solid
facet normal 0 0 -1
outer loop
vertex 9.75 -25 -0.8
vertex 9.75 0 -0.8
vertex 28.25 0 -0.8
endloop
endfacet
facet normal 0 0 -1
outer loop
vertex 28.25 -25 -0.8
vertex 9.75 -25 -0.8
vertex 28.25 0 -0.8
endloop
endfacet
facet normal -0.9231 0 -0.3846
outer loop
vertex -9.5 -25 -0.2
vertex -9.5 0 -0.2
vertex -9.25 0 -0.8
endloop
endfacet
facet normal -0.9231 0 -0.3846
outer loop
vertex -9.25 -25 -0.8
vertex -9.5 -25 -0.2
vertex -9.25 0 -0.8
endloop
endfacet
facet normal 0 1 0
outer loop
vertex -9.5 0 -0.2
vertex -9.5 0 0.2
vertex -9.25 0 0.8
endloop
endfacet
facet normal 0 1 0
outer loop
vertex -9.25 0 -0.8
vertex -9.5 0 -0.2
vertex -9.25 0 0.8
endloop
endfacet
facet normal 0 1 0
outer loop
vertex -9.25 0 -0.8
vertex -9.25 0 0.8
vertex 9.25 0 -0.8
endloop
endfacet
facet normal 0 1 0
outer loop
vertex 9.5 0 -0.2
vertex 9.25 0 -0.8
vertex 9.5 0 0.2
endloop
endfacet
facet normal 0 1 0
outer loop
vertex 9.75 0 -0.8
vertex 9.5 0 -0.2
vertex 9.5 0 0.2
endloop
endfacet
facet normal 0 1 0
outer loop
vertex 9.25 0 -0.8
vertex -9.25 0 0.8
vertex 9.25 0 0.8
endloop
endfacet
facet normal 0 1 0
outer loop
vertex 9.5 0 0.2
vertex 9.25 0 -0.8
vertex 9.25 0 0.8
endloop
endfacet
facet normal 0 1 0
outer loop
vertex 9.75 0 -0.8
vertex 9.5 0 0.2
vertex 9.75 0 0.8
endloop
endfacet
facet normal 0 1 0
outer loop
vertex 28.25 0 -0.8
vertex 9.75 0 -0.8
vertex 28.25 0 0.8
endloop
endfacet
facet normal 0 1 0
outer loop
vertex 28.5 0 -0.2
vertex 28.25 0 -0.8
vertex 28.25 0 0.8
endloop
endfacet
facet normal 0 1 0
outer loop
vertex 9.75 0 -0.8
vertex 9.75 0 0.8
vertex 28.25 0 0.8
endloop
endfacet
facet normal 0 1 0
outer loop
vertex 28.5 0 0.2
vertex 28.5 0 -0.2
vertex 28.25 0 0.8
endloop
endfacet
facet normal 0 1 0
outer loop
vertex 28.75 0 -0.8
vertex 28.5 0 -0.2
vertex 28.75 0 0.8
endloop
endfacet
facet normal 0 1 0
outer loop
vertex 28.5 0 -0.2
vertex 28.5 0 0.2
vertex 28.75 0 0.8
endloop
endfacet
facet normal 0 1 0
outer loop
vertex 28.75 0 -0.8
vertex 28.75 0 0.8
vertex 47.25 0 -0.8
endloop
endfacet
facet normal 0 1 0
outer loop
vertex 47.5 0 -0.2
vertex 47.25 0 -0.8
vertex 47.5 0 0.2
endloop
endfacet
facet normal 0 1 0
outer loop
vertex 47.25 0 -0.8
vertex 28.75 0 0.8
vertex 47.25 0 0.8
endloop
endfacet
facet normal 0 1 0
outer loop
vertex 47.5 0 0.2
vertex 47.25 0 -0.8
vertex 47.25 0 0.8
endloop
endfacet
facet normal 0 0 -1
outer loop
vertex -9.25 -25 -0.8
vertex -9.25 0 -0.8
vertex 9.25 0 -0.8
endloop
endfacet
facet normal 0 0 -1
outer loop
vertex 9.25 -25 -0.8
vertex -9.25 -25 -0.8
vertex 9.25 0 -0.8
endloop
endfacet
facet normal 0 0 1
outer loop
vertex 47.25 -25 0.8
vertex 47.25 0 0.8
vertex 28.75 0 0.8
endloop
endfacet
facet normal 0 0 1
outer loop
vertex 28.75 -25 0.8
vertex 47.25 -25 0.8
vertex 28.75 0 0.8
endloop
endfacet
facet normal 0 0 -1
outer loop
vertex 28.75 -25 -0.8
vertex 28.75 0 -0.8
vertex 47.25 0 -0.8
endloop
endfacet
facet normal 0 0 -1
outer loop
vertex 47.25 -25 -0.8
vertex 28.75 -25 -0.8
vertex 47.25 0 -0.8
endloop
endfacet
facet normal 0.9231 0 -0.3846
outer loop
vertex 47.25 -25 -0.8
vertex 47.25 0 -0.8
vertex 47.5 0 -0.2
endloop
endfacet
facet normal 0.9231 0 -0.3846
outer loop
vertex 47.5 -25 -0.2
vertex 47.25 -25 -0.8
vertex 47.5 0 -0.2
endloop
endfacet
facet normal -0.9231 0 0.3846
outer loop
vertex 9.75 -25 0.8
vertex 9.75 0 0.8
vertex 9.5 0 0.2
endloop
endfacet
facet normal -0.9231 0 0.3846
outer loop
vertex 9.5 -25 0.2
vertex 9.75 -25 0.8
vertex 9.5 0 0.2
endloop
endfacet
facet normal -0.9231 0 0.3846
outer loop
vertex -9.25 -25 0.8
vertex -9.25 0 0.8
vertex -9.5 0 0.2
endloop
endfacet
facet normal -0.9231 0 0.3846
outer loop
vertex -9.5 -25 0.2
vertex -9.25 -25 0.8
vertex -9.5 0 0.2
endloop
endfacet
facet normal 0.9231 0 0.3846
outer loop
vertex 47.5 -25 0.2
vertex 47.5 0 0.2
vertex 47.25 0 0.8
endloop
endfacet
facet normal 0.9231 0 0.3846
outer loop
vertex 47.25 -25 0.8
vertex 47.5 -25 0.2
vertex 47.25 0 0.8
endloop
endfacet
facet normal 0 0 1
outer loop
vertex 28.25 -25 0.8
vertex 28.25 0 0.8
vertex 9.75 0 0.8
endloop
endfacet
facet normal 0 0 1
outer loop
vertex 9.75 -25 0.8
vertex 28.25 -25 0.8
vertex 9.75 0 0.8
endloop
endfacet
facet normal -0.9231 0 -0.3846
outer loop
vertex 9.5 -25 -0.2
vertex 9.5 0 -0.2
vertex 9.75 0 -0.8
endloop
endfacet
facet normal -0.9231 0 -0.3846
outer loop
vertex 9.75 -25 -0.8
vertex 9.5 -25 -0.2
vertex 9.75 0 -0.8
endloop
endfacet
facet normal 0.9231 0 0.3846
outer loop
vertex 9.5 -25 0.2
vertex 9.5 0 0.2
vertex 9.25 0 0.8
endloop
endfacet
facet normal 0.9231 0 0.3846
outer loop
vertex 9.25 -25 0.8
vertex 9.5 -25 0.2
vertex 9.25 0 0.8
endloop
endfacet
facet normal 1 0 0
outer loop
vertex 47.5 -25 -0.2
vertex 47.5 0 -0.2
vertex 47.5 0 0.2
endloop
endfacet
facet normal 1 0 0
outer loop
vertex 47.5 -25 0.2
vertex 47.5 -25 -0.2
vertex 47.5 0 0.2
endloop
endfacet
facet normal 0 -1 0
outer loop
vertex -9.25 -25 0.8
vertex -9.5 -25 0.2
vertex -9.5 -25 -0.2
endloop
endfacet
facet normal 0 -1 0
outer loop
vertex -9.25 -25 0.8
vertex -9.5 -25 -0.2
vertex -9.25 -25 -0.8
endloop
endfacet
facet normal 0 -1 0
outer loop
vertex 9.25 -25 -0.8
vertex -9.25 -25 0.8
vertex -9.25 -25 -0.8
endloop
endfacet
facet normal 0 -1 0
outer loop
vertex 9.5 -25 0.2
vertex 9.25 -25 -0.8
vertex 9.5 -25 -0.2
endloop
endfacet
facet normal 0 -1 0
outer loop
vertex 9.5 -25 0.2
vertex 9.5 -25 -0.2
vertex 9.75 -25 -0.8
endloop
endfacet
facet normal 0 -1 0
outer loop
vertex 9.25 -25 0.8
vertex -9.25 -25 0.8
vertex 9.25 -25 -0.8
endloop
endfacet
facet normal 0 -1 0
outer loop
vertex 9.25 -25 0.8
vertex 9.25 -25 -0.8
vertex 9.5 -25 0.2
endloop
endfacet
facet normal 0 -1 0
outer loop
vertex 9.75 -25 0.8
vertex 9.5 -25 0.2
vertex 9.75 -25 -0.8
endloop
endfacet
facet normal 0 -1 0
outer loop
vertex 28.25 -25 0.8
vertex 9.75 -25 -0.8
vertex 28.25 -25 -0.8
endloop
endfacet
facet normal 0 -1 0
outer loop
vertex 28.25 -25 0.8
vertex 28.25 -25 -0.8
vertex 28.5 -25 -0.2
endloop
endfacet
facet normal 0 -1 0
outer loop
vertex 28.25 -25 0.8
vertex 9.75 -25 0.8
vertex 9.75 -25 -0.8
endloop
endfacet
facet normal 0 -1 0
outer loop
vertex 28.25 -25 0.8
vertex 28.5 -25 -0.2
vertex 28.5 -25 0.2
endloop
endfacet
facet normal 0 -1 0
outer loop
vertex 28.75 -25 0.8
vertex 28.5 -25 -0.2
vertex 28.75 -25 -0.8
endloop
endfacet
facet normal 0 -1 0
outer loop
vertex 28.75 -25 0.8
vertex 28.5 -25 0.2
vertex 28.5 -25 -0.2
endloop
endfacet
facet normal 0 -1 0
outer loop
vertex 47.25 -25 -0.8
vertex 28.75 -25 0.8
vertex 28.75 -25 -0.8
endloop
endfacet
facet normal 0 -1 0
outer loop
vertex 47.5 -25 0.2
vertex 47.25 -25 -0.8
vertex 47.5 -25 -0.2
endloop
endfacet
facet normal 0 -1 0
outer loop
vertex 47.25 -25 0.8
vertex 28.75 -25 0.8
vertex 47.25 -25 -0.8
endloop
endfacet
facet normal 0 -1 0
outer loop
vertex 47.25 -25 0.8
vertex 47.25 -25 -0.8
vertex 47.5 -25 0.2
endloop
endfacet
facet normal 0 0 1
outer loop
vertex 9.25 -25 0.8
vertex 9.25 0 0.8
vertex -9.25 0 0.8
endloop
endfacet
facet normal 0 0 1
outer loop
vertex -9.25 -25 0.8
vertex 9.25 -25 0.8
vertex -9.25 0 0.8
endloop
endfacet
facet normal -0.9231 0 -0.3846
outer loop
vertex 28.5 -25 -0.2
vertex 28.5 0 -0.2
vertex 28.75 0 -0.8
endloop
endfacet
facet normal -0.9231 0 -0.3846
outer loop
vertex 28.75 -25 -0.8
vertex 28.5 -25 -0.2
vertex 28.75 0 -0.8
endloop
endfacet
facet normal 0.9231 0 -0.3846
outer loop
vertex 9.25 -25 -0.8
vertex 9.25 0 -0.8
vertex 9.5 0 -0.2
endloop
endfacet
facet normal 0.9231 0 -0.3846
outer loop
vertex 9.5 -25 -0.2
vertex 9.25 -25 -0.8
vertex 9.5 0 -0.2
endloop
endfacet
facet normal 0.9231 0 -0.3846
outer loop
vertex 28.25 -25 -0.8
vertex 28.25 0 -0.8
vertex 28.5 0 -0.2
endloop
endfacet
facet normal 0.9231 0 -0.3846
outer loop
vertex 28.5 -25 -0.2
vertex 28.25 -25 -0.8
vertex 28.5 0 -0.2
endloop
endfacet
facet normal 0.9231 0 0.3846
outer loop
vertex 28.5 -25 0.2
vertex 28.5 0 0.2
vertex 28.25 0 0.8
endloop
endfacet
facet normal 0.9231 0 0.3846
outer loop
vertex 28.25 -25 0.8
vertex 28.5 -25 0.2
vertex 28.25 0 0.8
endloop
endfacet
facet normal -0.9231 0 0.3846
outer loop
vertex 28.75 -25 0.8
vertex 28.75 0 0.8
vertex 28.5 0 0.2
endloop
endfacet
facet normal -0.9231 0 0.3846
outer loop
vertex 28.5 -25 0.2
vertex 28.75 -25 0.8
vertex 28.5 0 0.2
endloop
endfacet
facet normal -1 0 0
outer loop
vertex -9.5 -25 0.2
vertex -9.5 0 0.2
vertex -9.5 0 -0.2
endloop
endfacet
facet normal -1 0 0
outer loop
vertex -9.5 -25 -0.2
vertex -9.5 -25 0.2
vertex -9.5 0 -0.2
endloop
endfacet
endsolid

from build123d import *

# Parameters (mm, degrees)
F1_DEPTH = 25


with BuildPart() as f1:
    # F0 (on Front) → F1 (new body)
    with BuildSketch(Plane.XZ):
        Polygon((9.25, 0.8), (0, 0.8), (-9.25, 0.8), (-9.5, 0.2), (-9.5, -0.2), (-9.25, -0.8), (0, -0.8), (9.25, -0.8), (9.5, -0.2), (9.75, -0.8), (19, -0.8), (28.25, -0.8), (28.5, -0.2), (28.75, -0.8), (38, -0.8), (47.25, -0.8), (47.5, -0.2), (47.5, 0.2), (47.25, 0.8), (38, 0.8), (28.75, 0.8), (28.5, 0.2), (28.25, 0.8), (19, 0.8), (9.75, 0.8), (9.5, 0.2), align=None)
    extrude(amount=F1_DEPTH)


solid = f1.part
